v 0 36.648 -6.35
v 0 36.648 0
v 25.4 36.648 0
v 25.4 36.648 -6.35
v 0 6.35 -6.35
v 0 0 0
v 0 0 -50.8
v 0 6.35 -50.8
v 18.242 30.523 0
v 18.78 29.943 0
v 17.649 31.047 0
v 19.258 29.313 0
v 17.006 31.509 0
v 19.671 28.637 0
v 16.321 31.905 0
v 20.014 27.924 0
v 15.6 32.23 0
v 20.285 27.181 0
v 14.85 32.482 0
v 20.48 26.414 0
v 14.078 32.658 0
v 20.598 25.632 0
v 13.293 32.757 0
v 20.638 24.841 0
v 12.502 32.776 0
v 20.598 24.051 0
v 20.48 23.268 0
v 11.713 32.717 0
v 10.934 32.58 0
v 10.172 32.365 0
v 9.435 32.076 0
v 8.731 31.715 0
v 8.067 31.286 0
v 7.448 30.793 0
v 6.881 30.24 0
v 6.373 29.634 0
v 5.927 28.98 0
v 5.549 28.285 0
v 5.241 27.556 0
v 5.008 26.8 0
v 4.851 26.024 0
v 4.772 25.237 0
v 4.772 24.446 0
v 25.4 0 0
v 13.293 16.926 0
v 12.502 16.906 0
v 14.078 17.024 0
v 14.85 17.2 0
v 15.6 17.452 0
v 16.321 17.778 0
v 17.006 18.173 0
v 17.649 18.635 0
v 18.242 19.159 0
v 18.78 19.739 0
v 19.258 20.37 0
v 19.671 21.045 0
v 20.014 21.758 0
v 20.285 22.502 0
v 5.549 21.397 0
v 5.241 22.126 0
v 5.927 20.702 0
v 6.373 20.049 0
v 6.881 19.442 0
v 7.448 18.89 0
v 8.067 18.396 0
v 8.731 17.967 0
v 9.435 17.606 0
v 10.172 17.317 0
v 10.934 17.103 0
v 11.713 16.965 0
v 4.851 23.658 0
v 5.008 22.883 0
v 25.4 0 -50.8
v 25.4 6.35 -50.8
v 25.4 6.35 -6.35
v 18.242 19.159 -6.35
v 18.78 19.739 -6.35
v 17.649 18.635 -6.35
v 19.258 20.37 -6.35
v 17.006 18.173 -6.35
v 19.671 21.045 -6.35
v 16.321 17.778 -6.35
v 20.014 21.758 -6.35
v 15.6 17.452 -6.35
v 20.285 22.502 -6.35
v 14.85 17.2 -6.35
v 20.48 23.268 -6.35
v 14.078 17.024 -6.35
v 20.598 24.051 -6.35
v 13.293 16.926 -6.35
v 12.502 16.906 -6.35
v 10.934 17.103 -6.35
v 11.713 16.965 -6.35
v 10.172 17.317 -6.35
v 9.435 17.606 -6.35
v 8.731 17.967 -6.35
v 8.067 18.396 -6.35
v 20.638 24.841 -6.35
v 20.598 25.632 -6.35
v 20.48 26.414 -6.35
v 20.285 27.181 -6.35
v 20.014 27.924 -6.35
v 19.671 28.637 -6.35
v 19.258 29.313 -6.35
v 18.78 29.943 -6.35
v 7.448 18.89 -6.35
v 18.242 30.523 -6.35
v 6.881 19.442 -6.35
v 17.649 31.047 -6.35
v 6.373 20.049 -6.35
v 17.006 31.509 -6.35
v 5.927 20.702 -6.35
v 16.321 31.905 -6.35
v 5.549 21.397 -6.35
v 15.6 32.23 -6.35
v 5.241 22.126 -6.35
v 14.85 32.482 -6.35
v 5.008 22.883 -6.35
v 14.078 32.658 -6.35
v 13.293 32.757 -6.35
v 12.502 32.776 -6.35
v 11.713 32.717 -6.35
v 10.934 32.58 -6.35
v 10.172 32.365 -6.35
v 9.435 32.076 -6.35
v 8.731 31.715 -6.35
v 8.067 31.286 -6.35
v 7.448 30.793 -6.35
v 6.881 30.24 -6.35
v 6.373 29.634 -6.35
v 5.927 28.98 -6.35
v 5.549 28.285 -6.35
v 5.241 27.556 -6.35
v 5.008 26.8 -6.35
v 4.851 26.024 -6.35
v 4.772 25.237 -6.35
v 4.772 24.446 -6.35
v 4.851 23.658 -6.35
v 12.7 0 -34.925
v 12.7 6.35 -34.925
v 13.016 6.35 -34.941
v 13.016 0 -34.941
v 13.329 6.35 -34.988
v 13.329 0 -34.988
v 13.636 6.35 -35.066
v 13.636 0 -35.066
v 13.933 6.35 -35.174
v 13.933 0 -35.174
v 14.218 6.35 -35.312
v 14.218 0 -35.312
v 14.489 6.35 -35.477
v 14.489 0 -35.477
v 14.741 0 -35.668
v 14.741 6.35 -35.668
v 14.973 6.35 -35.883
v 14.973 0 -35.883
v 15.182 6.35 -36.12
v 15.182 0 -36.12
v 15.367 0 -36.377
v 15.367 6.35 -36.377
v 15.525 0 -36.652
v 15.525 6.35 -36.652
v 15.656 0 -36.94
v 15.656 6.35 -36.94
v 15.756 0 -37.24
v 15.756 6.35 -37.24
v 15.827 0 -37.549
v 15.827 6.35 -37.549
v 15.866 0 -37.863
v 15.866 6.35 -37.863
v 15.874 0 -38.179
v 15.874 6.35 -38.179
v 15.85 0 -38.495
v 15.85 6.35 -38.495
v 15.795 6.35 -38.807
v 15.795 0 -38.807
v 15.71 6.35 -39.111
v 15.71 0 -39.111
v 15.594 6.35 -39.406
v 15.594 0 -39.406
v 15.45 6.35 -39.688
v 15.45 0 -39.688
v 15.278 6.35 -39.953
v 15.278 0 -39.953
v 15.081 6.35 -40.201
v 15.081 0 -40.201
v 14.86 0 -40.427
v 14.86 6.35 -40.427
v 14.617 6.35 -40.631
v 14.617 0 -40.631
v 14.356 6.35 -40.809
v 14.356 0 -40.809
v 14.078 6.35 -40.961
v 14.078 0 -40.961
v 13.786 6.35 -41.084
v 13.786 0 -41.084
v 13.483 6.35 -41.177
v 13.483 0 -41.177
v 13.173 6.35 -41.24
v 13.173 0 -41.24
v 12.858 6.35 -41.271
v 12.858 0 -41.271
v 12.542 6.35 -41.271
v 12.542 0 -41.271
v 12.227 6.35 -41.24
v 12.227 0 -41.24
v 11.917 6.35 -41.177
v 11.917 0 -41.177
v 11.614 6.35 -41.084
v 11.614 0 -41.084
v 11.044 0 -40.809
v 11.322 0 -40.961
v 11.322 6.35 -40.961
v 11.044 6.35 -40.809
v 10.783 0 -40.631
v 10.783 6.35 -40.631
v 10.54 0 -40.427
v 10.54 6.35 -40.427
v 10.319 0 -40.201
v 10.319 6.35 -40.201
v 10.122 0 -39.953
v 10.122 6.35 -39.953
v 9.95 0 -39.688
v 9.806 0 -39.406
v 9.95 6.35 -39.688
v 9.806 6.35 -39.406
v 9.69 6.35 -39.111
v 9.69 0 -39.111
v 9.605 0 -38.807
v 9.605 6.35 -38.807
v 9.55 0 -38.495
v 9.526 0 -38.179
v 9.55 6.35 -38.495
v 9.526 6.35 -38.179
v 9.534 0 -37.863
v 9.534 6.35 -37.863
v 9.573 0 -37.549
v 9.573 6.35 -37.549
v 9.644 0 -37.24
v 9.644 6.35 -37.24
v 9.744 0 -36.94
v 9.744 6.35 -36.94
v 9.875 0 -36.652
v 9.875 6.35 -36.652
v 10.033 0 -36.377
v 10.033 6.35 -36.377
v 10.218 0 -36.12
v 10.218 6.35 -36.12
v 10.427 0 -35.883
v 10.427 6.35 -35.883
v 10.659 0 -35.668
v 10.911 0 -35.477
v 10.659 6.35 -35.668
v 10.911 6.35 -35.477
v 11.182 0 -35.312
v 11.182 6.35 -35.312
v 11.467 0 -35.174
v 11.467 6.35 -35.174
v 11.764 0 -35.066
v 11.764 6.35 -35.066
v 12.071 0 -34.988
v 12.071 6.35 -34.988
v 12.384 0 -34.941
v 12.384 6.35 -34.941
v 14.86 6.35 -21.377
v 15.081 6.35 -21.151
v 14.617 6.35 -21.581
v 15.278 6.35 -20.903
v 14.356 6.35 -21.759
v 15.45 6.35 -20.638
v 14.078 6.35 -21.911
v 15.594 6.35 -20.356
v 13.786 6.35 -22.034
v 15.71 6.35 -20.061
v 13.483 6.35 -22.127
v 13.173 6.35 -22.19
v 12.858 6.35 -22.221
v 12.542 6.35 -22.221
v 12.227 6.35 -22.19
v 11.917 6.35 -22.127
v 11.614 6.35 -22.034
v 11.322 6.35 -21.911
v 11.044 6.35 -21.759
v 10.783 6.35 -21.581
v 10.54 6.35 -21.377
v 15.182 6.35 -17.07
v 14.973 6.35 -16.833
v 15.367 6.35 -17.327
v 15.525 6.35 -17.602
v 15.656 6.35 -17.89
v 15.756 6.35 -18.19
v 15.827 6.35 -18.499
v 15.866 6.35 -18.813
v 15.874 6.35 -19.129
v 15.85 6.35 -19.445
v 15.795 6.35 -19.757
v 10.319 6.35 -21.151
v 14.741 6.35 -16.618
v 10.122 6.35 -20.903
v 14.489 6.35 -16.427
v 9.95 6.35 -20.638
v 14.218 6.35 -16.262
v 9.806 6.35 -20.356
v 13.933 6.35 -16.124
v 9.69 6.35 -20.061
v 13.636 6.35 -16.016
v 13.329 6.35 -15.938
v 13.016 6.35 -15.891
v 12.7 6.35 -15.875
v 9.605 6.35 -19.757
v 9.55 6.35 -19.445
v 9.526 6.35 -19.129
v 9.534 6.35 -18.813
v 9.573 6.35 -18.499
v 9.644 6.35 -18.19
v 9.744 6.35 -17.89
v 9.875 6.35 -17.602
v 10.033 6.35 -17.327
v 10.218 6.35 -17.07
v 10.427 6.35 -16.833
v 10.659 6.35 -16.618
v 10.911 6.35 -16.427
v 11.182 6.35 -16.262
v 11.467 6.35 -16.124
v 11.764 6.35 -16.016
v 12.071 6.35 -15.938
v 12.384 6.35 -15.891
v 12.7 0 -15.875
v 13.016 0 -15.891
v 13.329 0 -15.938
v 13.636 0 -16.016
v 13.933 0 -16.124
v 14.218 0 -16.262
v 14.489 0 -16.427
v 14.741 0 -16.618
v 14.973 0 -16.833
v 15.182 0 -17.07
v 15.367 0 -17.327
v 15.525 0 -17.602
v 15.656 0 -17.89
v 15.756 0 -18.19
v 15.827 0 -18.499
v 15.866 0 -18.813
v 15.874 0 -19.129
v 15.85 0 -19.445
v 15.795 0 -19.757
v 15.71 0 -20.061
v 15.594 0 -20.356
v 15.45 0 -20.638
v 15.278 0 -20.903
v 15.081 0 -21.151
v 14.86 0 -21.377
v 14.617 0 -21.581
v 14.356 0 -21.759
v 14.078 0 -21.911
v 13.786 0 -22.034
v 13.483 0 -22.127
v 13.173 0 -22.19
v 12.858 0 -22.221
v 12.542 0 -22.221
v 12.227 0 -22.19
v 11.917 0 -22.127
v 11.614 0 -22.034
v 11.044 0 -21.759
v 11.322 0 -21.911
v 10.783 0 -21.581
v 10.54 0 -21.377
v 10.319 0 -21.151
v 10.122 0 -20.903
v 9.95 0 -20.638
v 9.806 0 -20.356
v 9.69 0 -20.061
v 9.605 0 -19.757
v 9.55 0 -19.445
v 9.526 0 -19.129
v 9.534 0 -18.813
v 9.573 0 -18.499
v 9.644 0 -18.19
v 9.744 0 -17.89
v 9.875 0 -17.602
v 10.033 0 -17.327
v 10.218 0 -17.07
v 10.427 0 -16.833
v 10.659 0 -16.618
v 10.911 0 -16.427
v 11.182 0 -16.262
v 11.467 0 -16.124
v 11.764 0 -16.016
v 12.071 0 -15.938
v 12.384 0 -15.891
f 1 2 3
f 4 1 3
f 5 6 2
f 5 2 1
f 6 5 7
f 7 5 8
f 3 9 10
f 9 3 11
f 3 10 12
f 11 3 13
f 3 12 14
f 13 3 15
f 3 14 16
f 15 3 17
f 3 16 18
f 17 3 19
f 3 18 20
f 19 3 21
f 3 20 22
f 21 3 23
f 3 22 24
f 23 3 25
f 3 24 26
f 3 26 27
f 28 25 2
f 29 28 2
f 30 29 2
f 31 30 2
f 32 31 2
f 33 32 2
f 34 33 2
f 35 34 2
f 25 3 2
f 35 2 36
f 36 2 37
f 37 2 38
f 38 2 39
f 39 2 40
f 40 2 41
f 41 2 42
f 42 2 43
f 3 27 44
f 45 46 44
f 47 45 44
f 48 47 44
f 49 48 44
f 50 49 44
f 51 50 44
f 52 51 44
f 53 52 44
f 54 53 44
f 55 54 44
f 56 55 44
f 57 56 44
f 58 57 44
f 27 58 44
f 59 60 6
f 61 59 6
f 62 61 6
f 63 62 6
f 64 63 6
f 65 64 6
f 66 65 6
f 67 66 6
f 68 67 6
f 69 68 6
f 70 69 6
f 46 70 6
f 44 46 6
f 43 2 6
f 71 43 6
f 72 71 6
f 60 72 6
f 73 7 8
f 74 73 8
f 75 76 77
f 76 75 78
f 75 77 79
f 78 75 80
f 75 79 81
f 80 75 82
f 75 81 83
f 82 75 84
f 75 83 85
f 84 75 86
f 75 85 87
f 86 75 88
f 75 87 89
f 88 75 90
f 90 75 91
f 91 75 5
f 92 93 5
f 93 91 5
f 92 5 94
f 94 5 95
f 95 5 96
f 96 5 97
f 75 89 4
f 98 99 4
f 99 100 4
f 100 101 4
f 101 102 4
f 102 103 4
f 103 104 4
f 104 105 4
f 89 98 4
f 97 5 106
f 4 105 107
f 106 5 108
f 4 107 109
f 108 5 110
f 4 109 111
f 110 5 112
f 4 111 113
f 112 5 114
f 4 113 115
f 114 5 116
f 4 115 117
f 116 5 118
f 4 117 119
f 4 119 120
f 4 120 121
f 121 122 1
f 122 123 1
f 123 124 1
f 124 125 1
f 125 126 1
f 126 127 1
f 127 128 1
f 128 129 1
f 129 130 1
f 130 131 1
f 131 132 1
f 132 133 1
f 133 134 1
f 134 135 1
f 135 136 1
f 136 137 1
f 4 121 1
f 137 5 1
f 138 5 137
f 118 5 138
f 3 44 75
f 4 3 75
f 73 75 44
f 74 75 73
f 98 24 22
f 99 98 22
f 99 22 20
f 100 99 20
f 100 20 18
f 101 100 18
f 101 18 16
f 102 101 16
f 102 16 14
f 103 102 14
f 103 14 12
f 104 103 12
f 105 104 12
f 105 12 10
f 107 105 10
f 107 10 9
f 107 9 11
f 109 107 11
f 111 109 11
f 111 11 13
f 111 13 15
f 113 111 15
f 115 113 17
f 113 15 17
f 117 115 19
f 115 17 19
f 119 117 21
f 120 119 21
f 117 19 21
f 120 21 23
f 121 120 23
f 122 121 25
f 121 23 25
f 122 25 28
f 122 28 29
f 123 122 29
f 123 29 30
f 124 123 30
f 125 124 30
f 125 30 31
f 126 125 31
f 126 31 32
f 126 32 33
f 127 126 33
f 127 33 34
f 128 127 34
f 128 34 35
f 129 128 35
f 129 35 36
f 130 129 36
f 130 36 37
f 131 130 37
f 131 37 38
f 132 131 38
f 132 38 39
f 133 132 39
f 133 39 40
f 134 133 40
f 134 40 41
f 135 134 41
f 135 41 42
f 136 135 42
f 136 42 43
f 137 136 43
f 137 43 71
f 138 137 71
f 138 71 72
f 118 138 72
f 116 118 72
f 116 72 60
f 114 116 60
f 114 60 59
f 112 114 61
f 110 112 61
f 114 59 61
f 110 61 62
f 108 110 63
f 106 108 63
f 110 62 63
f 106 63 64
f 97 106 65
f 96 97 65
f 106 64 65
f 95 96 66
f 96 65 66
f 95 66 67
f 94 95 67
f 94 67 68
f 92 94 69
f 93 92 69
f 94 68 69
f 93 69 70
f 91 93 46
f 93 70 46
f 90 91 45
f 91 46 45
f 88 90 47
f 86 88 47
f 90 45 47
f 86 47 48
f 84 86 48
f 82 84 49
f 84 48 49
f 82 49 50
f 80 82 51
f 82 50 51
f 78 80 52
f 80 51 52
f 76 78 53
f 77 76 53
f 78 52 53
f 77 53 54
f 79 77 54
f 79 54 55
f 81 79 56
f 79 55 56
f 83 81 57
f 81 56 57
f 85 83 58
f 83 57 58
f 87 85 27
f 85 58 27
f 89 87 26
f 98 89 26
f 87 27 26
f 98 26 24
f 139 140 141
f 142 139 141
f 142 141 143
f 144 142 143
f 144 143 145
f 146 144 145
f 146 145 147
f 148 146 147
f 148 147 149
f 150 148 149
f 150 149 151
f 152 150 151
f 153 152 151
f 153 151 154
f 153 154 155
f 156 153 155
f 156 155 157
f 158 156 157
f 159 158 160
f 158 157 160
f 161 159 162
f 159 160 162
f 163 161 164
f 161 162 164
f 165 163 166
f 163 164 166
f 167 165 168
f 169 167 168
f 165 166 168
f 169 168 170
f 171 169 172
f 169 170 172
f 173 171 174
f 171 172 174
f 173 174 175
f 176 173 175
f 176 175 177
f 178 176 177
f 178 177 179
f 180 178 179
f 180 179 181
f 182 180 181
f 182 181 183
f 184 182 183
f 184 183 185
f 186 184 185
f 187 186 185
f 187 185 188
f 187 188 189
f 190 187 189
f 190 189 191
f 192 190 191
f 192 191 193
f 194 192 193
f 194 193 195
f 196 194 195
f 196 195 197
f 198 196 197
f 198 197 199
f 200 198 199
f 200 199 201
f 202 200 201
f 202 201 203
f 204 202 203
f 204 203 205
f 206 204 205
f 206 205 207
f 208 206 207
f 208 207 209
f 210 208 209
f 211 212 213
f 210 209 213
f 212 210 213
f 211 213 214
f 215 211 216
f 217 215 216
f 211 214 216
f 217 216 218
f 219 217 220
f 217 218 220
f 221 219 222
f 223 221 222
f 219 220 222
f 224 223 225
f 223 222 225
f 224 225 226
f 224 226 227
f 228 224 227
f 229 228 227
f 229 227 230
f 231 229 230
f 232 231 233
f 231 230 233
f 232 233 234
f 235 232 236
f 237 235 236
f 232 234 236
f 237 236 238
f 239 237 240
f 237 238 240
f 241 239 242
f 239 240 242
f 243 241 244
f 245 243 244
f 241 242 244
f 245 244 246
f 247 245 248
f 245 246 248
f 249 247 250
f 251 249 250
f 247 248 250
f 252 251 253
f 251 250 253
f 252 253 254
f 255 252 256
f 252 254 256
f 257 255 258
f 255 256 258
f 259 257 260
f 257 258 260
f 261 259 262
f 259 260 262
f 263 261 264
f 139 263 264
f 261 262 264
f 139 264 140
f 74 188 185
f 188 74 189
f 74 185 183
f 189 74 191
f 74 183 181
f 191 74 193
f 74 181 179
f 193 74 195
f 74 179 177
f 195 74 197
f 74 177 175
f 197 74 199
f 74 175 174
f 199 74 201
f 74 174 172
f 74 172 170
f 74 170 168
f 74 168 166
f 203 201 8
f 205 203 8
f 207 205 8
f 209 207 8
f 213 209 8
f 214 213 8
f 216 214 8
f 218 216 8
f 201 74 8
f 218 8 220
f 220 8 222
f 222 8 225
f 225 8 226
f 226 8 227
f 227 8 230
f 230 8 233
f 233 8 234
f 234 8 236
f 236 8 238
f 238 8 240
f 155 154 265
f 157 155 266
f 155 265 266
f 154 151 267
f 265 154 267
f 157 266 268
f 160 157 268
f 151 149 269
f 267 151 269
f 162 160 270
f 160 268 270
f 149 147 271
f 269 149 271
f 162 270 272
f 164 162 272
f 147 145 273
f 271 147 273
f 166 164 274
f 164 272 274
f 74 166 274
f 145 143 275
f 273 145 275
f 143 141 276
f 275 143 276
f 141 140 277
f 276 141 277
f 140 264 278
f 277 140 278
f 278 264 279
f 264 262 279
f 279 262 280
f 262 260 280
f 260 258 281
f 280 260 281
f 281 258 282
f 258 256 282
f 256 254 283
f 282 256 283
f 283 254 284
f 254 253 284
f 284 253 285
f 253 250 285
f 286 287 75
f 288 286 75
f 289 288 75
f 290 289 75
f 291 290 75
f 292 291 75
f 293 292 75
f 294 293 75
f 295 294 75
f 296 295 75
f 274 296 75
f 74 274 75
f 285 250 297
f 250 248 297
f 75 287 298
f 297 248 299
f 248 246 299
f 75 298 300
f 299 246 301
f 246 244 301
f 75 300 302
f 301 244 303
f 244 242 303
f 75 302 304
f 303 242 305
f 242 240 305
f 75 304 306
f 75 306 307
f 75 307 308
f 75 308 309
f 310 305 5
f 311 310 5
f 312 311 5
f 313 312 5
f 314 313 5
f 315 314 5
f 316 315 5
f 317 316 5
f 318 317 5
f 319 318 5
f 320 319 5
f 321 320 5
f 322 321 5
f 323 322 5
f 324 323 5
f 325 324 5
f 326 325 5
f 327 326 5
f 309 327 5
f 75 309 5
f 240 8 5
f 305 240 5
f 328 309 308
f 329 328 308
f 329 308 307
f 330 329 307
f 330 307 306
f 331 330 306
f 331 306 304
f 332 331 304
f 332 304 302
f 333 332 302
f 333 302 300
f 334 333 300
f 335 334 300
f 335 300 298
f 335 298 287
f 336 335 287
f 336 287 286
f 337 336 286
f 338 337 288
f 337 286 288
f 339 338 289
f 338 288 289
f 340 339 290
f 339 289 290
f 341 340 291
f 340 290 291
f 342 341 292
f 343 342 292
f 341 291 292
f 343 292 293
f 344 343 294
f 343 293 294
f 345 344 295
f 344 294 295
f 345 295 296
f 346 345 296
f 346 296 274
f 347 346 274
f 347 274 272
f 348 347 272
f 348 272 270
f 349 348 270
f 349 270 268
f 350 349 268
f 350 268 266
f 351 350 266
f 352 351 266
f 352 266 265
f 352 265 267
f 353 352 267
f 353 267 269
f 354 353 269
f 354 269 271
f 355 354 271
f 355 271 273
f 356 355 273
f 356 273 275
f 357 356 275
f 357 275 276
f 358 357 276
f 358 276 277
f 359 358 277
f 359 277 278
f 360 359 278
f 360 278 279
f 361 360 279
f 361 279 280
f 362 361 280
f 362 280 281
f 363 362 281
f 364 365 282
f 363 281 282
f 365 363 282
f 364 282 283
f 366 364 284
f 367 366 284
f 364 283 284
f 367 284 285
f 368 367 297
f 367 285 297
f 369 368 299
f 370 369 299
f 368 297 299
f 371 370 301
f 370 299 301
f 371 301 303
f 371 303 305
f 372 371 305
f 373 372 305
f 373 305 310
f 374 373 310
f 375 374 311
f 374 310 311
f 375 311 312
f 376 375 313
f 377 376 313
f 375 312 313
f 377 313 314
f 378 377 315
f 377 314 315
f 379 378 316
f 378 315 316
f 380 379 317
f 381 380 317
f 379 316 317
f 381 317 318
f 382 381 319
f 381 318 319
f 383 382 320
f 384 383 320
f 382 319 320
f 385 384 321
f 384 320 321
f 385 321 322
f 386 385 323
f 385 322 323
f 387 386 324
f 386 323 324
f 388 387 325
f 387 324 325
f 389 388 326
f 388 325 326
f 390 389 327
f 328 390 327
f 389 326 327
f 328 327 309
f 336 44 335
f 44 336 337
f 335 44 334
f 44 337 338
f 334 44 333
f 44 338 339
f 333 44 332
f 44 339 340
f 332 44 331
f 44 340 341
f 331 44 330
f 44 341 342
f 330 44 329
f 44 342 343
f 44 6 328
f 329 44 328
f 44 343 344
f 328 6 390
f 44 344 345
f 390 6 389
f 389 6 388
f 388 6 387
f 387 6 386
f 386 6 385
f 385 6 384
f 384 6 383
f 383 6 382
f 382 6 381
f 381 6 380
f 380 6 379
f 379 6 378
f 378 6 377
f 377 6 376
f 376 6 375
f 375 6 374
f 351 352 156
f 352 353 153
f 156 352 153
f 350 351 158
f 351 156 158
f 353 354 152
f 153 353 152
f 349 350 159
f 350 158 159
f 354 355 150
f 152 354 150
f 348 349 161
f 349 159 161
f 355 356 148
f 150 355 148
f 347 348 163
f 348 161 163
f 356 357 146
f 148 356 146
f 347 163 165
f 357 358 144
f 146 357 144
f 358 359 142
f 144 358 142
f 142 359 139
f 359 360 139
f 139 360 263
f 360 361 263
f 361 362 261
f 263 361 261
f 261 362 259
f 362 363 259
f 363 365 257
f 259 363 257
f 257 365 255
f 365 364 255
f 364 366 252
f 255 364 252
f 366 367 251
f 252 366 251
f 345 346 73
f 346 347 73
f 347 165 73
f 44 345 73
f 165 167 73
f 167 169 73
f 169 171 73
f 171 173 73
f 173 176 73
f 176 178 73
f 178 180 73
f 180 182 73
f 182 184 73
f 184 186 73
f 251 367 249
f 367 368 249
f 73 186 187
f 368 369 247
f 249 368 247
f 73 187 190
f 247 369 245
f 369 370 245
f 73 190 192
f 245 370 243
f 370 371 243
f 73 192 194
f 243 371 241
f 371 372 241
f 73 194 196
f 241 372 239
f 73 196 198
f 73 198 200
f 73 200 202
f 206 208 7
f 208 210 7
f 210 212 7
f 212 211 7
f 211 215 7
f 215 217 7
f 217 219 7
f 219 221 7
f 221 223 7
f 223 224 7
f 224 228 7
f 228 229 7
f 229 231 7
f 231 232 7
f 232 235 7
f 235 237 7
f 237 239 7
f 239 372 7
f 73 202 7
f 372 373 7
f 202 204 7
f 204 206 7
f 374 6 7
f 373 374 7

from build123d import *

# Parameters (mm, degrees)
BOSS_EXTRUDE1_DEPTH          = 25.4
CUT_EXTRUDE1_REACH           = 92.027
SKETCH2_R                    = 3.175
F_5_8_0_625_DIAMETER_HOLE1_D = 15.875
CUT_EXTRUDE2_REACH           = 97.038
SKETCH5_W                    = 25.4
SKETCH5_H                    = 39.5524608


with BuildPart() as part:
    # Sketch1 → Boss-Extrude1 (new body)
    with BuildSketch(Plane(origin=(0, 0, 0), x_dir=(0, 0, -1), z_dir=(1, 0, 0))):
        Polygon((0, 76.2), (0, 0), (50.8, 0), (50.8, 6.35), (6.35, 6.35), (6.35, 76.2), align=None)
    extrude(amount=BOSS_EXTRUDE1_DEPTH)

    # Sketch2 → Cut-Extrude1 (cut, up to next)
    with BuildSketch(Plane(origin=(0, 6.35, 0), x_dir=(1, 0, 0), z_dir=(0, 1, 0)), mode=Mode.PRIVATE) as cut_extrude1_sk1:
        with Locations(Location((12.7, 38.1, 0), (0, 0, 270))):
            Circle(SKETCH2_R)
    cut_extrude1_tool1 = extrude(cut_extrude1_sk1.sketch, amount=-CUT_EXTRUDE1_REACH, mode=Mode.PRIVATE) & part.part
    # Sketch2 → Cut-Extrude1 (cut, up to next)
    with BuildSketch(Plane(origin=(0, 6.35, 0), x_dir=(1, 0, 0), z_dir=(0, 1, 0)), mode=Mode.PRIVATE) as cut_extrude1_sk2:
        with Locations(Location((12.7, 19.05, 0), (0, 0, 270))):
            Circle(SKETCH2_R)
    cut_extrude1_tool2 = extrude(cut_extrude1_sk2.sketch, amount=-CUT_EXTRUDE1_REACH, mode=Mode.PRIVATE) & part.part
    add(cut_extrude1_tool1.solids().sort_by_distance((12.7, 6.35, -38.1))[0], mode=Mode.SUBTRACT)
    add(cut_extrude1_tool2.solids().sort_by_distance((12.7, 6.35, -19.05))[0], mode=Mode.SUBTRACT)

    # 5/8 (0.625) Diameter Hole1 (through all)
    with Locations(Plane(origin=(0, 0, -6.35), x_dir=(-1, 0, 0), z_dir=(0, 0, -1))):
        with Locations((-12.7, 57.15), (-12.7, 24.8412)):
            Hole(F_5_8_0_625_DIAMETER_HOLE1_D / 2)

    # Sketch5 → Cut-Extrude2 (cut, up to next)
    with BuildSketch(Plane.XY, mode=Mode.PRIVATE) as cut_extrude2_sk1:
        with Locations((12.7, 56.4237696)):
            Rectangle(SKETCH5_W, SKETCH5_H)
    cut_extrude2_tool1 = extrude(cut_extrude2_sk1.sketch, amount=-CUT_EXTRUDE2_REACH, mode=Mode.PRIVATE) & part.part
    add(cut_extrude2_tool1.solids().sort_by_distance((12.7, 56.42377, 0))[0], mode=Mode.SUBTRACT)


solid = part.part
